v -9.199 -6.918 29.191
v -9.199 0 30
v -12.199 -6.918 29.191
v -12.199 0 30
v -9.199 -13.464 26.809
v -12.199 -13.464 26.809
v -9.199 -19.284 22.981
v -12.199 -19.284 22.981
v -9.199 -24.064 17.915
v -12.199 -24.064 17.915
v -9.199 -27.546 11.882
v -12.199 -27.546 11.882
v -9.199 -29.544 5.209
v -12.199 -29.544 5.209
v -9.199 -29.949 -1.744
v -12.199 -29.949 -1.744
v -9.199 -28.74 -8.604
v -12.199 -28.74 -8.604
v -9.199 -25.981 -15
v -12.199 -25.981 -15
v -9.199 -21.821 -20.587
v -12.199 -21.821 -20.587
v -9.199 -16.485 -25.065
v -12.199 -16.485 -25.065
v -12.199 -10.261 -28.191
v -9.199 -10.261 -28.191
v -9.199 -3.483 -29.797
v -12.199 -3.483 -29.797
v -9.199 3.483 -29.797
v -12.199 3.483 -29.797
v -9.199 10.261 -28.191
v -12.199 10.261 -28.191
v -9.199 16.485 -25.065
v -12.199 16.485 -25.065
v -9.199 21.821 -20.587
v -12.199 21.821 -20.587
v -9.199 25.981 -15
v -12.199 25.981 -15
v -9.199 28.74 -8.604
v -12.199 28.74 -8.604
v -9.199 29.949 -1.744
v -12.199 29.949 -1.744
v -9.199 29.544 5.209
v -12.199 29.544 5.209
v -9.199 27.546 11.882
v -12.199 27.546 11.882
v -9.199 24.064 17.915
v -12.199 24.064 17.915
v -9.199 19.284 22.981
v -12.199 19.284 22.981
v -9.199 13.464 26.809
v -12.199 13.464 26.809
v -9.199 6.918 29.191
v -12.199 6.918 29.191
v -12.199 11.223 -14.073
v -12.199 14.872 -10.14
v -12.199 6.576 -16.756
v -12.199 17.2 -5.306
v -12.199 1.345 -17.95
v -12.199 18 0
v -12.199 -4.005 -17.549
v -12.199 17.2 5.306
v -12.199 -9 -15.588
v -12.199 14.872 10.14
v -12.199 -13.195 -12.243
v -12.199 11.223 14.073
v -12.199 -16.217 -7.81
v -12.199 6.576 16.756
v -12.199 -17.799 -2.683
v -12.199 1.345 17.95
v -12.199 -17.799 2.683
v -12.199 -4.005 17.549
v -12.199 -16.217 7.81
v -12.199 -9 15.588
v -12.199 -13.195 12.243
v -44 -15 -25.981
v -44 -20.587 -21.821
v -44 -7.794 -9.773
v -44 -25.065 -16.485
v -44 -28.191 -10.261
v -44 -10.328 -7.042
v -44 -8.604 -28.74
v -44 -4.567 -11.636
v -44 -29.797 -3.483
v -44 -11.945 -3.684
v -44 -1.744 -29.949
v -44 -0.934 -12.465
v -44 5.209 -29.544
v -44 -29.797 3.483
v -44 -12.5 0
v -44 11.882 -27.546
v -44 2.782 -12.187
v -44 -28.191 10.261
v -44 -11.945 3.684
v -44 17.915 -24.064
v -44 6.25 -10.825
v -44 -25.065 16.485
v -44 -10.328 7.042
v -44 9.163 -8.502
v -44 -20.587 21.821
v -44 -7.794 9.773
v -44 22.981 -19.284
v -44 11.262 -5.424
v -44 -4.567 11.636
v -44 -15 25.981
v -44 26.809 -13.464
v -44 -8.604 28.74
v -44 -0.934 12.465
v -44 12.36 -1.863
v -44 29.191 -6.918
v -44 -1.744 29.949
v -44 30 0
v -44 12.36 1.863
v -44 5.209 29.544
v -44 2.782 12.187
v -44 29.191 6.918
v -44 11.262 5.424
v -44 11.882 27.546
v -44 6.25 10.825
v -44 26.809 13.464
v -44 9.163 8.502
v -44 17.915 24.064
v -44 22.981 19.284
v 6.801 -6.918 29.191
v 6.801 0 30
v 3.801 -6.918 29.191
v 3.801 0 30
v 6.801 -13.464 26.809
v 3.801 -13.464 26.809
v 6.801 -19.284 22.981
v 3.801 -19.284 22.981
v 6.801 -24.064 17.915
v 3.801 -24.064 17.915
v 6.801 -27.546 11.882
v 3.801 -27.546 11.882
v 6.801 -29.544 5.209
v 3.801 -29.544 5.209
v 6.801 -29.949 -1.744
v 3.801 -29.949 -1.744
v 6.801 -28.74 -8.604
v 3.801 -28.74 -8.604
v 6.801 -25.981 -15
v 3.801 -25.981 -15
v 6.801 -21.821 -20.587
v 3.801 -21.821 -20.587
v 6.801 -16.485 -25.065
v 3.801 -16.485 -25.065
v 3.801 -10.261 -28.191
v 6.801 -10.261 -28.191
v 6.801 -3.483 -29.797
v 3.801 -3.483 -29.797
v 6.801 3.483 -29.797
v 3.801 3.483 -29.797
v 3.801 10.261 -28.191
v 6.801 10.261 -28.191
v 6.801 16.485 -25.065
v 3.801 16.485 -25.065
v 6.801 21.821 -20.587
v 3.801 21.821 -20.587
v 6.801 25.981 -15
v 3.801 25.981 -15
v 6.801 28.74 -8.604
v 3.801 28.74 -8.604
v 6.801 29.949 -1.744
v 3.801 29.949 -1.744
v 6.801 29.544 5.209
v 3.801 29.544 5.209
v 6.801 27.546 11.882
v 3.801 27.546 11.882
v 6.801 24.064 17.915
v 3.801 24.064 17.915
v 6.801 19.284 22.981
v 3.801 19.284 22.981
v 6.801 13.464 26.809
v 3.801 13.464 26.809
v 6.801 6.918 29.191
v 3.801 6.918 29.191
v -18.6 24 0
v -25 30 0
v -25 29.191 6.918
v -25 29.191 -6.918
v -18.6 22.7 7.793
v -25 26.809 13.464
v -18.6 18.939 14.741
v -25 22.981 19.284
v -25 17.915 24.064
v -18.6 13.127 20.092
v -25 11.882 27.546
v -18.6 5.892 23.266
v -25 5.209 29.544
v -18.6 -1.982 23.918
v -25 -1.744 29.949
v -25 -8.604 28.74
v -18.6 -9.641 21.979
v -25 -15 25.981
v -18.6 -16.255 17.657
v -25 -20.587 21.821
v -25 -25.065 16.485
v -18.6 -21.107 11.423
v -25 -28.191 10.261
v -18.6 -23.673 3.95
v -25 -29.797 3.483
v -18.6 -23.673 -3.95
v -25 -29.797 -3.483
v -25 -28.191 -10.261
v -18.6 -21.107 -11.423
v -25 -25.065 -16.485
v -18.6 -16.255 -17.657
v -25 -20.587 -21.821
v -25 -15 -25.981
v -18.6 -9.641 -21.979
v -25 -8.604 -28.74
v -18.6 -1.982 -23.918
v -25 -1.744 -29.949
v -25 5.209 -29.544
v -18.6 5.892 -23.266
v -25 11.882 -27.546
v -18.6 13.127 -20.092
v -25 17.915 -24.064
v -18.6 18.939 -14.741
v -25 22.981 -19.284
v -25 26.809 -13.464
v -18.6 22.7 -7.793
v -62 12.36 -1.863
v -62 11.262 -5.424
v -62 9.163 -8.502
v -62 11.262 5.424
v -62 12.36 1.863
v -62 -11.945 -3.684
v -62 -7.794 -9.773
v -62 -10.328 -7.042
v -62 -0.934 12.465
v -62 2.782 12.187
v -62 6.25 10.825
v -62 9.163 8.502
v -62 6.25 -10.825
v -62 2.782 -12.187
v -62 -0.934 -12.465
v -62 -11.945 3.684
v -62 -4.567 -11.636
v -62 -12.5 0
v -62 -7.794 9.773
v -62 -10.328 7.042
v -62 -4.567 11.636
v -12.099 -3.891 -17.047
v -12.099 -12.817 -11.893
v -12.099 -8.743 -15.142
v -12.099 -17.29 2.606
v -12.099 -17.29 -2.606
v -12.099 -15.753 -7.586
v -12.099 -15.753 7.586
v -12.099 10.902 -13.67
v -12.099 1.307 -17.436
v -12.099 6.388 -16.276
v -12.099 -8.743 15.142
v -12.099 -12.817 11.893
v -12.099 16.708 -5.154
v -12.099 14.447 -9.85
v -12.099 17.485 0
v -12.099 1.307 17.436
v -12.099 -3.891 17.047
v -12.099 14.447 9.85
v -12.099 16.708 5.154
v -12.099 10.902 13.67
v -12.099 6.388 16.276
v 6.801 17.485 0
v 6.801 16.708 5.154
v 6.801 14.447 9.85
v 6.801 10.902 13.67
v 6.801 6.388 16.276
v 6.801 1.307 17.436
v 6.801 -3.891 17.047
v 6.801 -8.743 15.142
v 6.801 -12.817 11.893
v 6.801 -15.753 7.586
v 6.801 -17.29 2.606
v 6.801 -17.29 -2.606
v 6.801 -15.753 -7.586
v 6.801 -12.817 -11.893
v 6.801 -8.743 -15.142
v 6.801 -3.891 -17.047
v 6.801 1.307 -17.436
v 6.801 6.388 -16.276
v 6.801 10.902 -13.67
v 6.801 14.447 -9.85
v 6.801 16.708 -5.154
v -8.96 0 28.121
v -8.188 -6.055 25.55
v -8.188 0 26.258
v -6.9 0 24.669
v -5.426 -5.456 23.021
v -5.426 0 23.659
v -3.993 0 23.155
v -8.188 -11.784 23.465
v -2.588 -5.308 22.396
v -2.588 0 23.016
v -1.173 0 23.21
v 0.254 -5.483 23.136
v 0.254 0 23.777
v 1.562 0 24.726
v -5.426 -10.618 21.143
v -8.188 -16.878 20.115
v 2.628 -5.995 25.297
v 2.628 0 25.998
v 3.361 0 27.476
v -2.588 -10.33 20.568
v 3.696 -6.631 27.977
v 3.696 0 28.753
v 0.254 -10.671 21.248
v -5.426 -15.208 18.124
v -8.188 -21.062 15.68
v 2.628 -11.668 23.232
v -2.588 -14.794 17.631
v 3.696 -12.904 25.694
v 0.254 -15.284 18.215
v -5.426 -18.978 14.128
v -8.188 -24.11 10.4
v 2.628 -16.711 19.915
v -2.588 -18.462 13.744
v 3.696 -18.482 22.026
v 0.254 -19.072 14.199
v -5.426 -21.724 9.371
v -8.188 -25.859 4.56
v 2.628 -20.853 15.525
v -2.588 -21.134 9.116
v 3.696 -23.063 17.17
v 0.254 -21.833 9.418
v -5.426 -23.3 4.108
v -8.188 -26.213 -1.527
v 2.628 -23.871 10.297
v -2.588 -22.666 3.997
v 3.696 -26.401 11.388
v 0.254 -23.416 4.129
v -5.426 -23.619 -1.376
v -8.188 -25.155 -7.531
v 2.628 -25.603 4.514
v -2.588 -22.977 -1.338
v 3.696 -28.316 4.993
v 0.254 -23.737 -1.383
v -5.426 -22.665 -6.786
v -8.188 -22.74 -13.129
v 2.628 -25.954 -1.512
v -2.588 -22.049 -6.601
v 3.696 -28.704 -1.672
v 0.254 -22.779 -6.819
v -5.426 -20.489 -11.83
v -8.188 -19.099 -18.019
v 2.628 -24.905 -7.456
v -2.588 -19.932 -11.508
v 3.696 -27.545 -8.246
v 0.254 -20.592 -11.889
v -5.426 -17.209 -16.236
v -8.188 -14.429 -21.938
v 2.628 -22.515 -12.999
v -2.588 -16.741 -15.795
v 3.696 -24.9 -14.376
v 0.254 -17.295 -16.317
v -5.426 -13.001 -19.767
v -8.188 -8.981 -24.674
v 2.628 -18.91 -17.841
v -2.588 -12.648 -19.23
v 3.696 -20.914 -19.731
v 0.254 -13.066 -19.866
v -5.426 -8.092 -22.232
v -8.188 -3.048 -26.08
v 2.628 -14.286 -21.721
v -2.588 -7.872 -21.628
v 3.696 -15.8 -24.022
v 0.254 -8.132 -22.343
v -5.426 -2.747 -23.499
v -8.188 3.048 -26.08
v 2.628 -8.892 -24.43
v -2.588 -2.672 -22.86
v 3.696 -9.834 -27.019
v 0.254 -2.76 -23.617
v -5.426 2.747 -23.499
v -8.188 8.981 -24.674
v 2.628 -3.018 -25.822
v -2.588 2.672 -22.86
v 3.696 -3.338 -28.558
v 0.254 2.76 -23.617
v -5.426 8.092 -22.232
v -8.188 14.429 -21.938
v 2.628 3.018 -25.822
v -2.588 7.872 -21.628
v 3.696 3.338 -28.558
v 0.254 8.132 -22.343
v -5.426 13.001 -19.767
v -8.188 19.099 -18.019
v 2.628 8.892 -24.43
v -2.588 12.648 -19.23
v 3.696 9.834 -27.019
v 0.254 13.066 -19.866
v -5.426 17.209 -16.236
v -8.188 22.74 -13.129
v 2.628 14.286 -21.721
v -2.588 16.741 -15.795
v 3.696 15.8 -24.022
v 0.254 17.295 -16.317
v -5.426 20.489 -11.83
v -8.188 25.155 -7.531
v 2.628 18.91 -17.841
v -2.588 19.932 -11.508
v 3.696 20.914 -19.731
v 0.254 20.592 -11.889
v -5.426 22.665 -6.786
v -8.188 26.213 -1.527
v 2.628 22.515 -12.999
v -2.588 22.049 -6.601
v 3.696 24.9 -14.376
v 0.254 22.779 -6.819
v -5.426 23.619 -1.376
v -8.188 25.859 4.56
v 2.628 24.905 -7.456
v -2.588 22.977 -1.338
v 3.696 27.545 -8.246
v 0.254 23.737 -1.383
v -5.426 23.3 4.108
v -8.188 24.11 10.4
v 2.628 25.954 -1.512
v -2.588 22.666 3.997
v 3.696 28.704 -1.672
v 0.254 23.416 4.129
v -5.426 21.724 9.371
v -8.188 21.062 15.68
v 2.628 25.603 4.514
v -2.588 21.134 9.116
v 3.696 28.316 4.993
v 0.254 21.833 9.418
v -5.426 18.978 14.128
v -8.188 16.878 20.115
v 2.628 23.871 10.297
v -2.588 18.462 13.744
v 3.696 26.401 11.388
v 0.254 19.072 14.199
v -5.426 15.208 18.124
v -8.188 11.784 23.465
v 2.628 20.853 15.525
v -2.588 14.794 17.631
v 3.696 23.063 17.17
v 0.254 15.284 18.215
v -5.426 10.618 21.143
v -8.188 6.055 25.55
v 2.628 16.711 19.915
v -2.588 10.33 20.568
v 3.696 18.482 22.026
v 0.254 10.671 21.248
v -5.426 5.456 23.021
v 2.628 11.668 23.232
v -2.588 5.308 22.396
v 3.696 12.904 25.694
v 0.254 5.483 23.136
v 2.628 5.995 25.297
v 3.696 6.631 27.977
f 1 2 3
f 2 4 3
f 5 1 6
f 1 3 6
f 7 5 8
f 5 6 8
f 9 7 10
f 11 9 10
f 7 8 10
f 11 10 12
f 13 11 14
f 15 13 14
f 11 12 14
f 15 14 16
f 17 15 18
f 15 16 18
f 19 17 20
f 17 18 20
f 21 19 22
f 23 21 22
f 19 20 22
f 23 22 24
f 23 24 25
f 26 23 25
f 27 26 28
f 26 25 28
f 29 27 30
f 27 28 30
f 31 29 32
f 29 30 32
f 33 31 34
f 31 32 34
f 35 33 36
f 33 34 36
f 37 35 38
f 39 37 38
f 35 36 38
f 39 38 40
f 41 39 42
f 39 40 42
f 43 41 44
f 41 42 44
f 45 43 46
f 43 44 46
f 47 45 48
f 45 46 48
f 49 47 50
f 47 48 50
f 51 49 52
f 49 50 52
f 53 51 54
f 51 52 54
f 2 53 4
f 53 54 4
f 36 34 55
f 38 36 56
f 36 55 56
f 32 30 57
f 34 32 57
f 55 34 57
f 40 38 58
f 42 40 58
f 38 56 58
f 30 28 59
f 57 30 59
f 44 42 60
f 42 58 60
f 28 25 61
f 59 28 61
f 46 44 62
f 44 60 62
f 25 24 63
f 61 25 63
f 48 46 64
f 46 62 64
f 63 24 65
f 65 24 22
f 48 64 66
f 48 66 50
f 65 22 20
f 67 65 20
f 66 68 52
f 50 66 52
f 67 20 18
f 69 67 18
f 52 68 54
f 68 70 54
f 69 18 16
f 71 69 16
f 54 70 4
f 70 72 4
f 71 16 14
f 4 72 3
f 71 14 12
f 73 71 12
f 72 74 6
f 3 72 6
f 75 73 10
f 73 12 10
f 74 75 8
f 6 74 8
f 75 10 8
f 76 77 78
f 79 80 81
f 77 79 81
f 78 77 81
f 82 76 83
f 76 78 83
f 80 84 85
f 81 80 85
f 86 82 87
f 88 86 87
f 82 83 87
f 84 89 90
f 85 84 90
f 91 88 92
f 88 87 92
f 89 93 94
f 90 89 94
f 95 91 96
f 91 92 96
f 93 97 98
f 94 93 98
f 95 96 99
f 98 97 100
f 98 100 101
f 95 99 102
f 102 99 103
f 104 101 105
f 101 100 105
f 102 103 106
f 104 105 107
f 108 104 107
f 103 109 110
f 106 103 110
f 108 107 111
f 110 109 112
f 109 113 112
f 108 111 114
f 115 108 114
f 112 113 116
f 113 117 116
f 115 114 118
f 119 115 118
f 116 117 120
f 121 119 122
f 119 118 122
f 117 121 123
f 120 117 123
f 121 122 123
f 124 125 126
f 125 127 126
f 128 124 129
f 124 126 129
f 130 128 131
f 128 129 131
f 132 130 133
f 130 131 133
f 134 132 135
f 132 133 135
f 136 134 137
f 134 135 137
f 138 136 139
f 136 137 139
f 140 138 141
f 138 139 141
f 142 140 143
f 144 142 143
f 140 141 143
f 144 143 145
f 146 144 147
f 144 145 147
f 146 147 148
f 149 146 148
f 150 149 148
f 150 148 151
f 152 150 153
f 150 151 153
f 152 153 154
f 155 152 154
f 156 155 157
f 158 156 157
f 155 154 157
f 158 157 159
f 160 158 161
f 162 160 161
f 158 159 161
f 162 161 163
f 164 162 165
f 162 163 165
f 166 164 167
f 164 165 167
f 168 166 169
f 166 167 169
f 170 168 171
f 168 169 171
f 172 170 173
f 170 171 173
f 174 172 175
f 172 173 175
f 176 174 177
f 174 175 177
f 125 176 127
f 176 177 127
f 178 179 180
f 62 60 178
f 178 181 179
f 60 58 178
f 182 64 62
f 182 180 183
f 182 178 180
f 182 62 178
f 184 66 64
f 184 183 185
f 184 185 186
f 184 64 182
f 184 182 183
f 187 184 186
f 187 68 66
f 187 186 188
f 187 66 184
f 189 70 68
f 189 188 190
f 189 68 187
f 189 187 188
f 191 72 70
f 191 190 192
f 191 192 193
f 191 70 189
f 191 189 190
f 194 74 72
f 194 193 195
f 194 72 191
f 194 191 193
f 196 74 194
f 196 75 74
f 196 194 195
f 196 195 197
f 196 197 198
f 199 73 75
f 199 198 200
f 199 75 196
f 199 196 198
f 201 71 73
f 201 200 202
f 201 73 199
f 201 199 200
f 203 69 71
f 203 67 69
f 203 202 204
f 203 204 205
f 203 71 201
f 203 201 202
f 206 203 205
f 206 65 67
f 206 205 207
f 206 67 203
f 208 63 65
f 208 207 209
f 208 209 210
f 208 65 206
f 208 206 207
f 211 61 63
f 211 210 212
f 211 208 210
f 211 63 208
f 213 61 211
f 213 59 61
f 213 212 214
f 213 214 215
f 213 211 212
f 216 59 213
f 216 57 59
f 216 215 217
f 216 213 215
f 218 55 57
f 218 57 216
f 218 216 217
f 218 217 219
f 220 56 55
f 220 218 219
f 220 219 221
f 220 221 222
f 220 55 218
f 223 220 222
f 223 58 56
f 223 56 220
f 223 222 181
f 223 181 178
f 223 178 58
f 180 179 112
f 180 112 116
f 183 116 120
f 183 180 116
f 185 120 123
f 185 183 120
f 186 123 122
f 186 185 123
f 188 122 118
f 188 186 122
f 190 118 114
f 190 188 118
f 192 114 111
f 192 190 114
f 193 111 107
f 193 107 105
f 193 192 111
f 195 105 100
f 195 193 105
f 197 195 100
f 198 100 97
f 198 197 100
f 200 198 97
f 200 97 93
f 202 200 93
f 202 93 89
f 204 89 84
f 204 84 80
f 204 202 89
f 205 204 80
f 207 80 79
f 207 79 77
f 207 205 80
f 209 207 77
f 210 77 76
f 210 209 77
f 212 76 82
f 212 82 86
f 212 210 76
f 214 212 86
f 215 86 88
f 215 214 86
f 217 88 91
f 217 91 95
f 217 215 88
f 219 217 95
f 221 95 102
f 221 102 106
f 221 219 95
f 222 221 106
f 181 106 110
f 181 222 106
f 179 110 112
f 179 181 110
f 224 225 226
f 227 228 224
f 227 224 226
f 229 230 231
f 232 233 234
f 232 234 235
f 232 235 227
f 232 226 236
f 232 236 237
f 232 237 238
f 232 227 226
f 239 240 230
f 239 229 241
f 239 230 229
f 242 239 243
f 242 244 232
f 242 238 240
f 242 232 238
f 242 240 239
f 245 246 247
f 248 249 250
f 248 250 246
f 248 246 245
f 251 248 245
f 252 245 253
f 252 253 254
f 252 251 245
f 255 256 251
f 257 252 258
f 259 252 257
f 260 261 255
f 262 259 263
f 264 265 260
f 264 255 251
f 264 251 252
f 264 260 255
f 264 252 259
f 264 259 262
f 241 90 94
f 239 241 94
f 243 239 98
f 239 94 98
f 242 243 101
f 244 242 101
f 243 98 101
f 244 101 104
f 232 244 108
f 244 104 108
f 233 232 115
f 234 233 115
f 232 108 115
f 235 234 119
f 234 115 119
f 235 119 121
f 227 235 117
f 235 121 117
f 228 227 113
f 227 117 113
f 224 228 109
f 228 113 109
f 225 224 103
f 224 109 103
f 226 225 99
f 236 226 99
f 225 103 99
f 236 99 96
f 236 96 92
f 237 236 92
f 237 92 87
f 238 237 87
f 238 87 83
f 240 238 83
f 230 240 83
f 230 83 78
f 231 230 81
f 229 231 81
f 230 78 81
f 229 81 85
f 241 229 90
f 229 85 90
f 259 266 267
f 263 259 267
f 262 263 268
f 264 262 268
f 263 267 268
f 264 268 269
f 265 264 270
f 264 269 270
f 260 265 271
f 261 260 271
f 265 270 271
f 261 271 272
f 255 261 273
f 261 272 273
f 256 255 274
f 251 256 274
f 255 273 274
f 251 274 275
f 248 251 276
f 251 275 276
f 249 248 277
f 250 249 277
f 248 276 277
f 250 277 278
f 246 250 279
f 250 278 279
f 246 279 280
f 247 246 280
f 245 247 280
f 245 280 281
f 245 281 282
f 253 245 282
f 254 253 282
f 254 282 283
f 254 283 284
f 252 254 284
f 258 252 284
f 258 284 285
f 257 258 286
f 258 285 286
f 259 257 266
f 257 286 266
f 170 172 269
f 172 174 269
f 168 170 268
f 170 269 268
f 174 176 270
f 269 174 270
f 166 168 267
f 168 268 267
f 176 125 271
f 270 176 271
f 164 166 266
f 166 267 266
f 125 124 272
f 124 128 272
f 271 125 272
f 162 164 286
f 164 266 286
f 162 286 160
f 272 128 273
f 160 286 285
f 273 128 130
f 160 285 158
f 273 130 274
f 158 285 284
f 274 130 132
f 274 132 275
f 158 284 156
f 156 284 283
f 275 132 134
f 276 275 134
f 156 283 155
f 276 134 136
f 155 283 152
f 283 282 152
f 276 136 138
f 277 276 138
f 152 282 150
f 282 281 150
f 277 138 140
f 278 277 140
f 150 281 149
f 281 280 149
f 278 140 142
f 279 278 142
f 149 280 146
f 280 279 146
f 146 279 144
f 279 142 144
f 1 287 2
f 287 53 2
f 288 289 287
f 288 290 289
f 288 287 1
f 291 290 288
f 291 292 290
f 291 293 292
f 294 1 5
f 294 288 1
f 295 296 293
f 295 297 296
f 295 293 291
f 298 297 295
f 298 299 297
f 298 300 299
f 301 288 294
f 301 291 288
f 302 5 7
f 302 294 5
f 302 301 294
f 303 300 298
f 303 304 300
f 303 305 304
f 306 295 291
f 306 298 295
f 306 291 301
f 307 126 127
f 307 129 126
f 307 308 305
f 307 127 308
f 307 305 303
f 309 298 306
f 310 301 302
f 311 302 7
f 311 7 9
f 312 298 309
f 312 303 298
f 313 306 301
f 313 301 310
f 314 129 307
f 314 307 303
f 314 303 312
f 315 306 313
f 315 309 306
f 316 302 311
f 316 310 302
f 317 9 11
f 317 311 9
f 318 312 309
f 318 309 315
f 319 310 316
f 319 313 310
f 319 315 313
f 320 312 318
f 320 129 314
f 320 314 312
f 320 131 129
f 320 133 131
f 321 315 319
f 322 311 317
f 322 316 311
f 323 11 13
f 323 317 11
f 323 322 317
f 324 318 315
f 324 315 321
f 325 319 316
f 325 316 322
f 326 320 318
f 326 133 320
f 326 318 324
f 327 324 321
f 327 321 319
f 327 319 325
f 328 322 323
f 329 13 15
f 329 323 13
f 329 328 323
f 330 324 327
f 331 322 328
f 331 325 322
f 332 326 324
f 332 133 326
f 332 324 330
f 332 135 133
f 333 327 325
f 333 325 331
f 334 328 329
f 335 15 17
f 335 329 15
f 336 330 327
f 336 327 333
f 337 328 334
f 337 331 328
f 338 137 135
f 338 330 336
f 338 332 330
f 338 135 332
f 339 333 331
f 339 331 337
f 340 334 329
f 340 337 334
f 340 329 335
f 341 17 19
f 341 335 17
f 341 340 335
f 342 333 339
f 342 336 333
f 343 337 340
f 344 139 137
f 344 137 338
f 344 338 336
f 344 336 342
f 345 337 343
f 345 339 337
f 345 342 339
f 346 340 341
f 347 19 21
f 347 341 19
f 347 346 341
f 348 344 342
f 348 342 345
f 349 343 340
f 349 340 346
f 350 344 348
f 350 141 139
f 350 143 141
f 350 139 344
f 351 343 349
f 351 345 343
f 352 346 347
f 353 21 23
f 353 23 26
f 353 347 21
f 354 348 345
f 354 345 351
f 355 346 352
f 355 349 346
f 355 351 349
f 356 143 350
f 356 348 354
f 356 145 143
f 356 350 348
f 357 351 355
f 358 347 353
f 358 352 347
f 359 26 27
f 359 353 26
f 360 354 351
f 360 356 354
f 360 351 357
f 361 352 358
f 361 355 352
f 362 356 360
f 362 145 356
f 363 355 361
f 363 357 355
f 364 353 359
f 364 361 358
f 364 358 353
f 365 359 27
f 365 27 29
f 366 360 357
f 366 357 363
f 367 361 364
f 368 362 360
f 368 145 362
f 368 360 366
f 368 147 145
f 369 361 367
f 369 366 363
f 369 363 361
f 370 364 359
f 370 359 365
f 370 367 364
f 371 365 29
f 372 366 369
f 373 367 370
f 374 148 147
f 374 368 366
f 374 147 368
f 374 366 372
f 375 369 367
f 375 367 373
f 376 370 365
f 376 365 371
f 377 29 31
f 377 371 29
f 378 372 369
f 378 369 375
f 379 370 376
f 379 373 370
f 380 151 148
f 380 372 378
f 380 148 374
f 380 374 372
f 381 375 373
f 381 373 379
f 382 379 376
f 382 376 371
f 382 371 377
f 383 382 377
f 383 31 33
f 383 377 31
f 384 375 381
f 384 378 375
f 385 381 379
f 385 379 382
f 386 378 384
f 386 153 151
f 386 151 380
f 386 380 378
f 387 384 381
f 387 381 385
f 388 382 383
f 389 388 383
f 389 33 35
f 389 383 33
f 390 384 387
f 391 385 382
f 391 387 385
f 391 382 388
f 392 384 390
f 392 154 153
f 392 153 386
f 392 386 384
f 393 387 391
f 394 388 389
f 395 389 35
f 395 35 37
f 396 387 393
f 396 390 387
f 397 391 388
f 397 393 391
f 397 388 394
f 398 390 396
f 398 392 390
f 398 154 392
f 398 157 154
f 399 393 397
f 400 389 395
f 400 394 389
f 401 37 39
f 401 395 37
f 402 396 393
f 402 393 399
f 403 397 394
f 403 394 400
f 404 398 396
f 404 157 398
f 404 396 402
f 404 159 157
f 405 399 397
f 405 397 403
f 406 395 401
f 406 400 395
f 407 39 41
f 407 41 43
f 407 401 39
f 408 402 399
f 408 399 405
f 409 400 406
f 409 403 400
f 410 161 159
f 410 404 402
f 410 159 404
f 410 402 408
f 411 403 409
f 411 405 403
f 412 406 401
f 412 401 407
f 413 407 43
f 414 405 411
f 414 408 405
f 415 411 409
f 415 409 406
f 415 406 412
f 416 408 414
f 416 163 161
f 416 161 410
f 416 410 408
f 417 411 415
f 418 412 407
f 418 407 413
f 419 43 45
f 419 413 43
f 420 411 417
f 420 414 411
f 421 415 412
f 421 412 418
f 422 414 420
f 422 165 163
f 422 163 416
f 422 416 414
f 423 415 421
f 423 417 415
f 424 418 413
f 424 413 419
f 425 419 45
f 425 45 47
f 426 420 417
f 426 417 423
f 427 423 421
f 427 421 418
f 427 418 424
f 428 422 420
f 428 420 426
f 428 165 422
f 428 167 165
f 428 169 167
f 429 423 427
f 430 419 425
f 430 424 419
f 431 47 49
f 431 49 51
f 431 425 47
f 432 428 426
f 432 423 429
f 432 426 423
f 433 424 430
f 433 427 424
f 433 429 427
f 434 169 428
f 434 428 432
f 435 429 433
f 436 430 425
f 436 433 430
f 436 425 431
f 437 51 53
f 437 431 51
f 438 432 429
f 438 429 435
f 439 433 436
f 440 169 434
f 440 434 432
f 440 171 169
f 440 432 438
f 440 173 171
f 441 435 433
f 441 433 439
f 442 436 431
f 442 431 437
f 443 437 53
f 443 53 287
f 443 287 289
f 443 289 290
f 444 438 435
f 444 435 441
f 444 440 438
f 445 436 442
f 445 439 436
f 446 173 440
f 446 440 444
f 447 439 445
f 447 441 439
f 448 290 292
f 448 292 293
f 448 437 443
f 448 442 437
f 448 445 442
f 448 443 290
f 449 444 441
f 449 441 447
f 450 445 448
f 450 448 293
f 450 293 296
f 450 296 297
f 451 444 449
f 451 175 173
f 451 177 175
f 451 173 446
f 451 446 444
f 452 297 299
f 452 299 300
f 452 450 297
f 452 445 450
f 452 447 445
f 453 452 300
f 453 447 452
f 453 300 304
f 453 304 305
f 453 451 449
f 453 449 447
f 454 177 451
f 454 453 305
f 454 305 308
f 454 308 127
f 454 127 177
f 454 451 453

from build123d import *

# Parameters (mm, degrees)
F2_R      = 17.485
F3_DEPTH  = 18.9
F6_R      = 30
F4_R      = 18
F8_DEPTH  = 19
F9_R      = 12.5
F10_DEPTH = 18


with BuildPart() as f1:
    # F0 (on Front) → F1 (revolve)
    with BuildSketch(Plane.XZ):
        with BuildLine():
            Line((-12.1993720531, 30), (-12.1993720531, 0))
            Line((-12.1993720531, 0), (6.8006279469, 0))
            Line((6.8006279469, 0), (6.8006279469, 30))
            Line((6.8006279469, 30), (3.8006279469, 30))
            add(Edge.make_bspline(
                [(-9.1993720531, 30), (-9.1993720531, 23.015), (-2.6993720531, 23.015), (3.8006279469, 23.015), (3.8006279469, 30)],
                knots=[4.7123889804, 4.7123889804, 4.7123889804, 6.2831853072, 6.2831853072, 7.853981634, 7.853981634, 7.853981634], degree=2, weights=[1, 0.7071067812, 1, 0.7071067812, 1]))
            Line((-9.1993720531, 30), (-12.1993720531, 30))
        make_face()
    revolve(axis=Axis((-2.6993720531, 0, 0), (1, 0, 0)))

    # F2 (on face) → F3 (cut)
    with BuildSketch(Plane.YZ.offset(6.8006279469)):
        Circle(F2_R)
    extrude(amount=-F3_DEPTH, mode=Mode.SUBTRACT)

    # F6 (on offset) → F7 section 0
    with BuildSketch(Plane.YZ.offset(-25)):
        Circle(F6_R)
    # F4 (on face) → F7 section 1
    with BuildSketch(Plane(origin=(-12.1993720531, 0, 0), x_dir=(0, -1, 0), z_dir=(-1, 0, 0))):
        Circle(F4_R)
    loft()

    # F8 (add): a face of the model
    f8_faces = [f1.faces().sort_by_distance(p)[0] for p in [
        (-25, 0, 0),
    ]]
    extrude(f8_faces, amount=F8_DEPTH)

    # F9 (on face) → F10 (join)
    with BuildSketch(Plane(origin=(-44, 0, 0), x_dir=(0, -1, 0), z_dir=(-1, 0, 0))):
        Circle(F9_R)
    extrude(amount=F10_DEPTH)


solid = f1.part
